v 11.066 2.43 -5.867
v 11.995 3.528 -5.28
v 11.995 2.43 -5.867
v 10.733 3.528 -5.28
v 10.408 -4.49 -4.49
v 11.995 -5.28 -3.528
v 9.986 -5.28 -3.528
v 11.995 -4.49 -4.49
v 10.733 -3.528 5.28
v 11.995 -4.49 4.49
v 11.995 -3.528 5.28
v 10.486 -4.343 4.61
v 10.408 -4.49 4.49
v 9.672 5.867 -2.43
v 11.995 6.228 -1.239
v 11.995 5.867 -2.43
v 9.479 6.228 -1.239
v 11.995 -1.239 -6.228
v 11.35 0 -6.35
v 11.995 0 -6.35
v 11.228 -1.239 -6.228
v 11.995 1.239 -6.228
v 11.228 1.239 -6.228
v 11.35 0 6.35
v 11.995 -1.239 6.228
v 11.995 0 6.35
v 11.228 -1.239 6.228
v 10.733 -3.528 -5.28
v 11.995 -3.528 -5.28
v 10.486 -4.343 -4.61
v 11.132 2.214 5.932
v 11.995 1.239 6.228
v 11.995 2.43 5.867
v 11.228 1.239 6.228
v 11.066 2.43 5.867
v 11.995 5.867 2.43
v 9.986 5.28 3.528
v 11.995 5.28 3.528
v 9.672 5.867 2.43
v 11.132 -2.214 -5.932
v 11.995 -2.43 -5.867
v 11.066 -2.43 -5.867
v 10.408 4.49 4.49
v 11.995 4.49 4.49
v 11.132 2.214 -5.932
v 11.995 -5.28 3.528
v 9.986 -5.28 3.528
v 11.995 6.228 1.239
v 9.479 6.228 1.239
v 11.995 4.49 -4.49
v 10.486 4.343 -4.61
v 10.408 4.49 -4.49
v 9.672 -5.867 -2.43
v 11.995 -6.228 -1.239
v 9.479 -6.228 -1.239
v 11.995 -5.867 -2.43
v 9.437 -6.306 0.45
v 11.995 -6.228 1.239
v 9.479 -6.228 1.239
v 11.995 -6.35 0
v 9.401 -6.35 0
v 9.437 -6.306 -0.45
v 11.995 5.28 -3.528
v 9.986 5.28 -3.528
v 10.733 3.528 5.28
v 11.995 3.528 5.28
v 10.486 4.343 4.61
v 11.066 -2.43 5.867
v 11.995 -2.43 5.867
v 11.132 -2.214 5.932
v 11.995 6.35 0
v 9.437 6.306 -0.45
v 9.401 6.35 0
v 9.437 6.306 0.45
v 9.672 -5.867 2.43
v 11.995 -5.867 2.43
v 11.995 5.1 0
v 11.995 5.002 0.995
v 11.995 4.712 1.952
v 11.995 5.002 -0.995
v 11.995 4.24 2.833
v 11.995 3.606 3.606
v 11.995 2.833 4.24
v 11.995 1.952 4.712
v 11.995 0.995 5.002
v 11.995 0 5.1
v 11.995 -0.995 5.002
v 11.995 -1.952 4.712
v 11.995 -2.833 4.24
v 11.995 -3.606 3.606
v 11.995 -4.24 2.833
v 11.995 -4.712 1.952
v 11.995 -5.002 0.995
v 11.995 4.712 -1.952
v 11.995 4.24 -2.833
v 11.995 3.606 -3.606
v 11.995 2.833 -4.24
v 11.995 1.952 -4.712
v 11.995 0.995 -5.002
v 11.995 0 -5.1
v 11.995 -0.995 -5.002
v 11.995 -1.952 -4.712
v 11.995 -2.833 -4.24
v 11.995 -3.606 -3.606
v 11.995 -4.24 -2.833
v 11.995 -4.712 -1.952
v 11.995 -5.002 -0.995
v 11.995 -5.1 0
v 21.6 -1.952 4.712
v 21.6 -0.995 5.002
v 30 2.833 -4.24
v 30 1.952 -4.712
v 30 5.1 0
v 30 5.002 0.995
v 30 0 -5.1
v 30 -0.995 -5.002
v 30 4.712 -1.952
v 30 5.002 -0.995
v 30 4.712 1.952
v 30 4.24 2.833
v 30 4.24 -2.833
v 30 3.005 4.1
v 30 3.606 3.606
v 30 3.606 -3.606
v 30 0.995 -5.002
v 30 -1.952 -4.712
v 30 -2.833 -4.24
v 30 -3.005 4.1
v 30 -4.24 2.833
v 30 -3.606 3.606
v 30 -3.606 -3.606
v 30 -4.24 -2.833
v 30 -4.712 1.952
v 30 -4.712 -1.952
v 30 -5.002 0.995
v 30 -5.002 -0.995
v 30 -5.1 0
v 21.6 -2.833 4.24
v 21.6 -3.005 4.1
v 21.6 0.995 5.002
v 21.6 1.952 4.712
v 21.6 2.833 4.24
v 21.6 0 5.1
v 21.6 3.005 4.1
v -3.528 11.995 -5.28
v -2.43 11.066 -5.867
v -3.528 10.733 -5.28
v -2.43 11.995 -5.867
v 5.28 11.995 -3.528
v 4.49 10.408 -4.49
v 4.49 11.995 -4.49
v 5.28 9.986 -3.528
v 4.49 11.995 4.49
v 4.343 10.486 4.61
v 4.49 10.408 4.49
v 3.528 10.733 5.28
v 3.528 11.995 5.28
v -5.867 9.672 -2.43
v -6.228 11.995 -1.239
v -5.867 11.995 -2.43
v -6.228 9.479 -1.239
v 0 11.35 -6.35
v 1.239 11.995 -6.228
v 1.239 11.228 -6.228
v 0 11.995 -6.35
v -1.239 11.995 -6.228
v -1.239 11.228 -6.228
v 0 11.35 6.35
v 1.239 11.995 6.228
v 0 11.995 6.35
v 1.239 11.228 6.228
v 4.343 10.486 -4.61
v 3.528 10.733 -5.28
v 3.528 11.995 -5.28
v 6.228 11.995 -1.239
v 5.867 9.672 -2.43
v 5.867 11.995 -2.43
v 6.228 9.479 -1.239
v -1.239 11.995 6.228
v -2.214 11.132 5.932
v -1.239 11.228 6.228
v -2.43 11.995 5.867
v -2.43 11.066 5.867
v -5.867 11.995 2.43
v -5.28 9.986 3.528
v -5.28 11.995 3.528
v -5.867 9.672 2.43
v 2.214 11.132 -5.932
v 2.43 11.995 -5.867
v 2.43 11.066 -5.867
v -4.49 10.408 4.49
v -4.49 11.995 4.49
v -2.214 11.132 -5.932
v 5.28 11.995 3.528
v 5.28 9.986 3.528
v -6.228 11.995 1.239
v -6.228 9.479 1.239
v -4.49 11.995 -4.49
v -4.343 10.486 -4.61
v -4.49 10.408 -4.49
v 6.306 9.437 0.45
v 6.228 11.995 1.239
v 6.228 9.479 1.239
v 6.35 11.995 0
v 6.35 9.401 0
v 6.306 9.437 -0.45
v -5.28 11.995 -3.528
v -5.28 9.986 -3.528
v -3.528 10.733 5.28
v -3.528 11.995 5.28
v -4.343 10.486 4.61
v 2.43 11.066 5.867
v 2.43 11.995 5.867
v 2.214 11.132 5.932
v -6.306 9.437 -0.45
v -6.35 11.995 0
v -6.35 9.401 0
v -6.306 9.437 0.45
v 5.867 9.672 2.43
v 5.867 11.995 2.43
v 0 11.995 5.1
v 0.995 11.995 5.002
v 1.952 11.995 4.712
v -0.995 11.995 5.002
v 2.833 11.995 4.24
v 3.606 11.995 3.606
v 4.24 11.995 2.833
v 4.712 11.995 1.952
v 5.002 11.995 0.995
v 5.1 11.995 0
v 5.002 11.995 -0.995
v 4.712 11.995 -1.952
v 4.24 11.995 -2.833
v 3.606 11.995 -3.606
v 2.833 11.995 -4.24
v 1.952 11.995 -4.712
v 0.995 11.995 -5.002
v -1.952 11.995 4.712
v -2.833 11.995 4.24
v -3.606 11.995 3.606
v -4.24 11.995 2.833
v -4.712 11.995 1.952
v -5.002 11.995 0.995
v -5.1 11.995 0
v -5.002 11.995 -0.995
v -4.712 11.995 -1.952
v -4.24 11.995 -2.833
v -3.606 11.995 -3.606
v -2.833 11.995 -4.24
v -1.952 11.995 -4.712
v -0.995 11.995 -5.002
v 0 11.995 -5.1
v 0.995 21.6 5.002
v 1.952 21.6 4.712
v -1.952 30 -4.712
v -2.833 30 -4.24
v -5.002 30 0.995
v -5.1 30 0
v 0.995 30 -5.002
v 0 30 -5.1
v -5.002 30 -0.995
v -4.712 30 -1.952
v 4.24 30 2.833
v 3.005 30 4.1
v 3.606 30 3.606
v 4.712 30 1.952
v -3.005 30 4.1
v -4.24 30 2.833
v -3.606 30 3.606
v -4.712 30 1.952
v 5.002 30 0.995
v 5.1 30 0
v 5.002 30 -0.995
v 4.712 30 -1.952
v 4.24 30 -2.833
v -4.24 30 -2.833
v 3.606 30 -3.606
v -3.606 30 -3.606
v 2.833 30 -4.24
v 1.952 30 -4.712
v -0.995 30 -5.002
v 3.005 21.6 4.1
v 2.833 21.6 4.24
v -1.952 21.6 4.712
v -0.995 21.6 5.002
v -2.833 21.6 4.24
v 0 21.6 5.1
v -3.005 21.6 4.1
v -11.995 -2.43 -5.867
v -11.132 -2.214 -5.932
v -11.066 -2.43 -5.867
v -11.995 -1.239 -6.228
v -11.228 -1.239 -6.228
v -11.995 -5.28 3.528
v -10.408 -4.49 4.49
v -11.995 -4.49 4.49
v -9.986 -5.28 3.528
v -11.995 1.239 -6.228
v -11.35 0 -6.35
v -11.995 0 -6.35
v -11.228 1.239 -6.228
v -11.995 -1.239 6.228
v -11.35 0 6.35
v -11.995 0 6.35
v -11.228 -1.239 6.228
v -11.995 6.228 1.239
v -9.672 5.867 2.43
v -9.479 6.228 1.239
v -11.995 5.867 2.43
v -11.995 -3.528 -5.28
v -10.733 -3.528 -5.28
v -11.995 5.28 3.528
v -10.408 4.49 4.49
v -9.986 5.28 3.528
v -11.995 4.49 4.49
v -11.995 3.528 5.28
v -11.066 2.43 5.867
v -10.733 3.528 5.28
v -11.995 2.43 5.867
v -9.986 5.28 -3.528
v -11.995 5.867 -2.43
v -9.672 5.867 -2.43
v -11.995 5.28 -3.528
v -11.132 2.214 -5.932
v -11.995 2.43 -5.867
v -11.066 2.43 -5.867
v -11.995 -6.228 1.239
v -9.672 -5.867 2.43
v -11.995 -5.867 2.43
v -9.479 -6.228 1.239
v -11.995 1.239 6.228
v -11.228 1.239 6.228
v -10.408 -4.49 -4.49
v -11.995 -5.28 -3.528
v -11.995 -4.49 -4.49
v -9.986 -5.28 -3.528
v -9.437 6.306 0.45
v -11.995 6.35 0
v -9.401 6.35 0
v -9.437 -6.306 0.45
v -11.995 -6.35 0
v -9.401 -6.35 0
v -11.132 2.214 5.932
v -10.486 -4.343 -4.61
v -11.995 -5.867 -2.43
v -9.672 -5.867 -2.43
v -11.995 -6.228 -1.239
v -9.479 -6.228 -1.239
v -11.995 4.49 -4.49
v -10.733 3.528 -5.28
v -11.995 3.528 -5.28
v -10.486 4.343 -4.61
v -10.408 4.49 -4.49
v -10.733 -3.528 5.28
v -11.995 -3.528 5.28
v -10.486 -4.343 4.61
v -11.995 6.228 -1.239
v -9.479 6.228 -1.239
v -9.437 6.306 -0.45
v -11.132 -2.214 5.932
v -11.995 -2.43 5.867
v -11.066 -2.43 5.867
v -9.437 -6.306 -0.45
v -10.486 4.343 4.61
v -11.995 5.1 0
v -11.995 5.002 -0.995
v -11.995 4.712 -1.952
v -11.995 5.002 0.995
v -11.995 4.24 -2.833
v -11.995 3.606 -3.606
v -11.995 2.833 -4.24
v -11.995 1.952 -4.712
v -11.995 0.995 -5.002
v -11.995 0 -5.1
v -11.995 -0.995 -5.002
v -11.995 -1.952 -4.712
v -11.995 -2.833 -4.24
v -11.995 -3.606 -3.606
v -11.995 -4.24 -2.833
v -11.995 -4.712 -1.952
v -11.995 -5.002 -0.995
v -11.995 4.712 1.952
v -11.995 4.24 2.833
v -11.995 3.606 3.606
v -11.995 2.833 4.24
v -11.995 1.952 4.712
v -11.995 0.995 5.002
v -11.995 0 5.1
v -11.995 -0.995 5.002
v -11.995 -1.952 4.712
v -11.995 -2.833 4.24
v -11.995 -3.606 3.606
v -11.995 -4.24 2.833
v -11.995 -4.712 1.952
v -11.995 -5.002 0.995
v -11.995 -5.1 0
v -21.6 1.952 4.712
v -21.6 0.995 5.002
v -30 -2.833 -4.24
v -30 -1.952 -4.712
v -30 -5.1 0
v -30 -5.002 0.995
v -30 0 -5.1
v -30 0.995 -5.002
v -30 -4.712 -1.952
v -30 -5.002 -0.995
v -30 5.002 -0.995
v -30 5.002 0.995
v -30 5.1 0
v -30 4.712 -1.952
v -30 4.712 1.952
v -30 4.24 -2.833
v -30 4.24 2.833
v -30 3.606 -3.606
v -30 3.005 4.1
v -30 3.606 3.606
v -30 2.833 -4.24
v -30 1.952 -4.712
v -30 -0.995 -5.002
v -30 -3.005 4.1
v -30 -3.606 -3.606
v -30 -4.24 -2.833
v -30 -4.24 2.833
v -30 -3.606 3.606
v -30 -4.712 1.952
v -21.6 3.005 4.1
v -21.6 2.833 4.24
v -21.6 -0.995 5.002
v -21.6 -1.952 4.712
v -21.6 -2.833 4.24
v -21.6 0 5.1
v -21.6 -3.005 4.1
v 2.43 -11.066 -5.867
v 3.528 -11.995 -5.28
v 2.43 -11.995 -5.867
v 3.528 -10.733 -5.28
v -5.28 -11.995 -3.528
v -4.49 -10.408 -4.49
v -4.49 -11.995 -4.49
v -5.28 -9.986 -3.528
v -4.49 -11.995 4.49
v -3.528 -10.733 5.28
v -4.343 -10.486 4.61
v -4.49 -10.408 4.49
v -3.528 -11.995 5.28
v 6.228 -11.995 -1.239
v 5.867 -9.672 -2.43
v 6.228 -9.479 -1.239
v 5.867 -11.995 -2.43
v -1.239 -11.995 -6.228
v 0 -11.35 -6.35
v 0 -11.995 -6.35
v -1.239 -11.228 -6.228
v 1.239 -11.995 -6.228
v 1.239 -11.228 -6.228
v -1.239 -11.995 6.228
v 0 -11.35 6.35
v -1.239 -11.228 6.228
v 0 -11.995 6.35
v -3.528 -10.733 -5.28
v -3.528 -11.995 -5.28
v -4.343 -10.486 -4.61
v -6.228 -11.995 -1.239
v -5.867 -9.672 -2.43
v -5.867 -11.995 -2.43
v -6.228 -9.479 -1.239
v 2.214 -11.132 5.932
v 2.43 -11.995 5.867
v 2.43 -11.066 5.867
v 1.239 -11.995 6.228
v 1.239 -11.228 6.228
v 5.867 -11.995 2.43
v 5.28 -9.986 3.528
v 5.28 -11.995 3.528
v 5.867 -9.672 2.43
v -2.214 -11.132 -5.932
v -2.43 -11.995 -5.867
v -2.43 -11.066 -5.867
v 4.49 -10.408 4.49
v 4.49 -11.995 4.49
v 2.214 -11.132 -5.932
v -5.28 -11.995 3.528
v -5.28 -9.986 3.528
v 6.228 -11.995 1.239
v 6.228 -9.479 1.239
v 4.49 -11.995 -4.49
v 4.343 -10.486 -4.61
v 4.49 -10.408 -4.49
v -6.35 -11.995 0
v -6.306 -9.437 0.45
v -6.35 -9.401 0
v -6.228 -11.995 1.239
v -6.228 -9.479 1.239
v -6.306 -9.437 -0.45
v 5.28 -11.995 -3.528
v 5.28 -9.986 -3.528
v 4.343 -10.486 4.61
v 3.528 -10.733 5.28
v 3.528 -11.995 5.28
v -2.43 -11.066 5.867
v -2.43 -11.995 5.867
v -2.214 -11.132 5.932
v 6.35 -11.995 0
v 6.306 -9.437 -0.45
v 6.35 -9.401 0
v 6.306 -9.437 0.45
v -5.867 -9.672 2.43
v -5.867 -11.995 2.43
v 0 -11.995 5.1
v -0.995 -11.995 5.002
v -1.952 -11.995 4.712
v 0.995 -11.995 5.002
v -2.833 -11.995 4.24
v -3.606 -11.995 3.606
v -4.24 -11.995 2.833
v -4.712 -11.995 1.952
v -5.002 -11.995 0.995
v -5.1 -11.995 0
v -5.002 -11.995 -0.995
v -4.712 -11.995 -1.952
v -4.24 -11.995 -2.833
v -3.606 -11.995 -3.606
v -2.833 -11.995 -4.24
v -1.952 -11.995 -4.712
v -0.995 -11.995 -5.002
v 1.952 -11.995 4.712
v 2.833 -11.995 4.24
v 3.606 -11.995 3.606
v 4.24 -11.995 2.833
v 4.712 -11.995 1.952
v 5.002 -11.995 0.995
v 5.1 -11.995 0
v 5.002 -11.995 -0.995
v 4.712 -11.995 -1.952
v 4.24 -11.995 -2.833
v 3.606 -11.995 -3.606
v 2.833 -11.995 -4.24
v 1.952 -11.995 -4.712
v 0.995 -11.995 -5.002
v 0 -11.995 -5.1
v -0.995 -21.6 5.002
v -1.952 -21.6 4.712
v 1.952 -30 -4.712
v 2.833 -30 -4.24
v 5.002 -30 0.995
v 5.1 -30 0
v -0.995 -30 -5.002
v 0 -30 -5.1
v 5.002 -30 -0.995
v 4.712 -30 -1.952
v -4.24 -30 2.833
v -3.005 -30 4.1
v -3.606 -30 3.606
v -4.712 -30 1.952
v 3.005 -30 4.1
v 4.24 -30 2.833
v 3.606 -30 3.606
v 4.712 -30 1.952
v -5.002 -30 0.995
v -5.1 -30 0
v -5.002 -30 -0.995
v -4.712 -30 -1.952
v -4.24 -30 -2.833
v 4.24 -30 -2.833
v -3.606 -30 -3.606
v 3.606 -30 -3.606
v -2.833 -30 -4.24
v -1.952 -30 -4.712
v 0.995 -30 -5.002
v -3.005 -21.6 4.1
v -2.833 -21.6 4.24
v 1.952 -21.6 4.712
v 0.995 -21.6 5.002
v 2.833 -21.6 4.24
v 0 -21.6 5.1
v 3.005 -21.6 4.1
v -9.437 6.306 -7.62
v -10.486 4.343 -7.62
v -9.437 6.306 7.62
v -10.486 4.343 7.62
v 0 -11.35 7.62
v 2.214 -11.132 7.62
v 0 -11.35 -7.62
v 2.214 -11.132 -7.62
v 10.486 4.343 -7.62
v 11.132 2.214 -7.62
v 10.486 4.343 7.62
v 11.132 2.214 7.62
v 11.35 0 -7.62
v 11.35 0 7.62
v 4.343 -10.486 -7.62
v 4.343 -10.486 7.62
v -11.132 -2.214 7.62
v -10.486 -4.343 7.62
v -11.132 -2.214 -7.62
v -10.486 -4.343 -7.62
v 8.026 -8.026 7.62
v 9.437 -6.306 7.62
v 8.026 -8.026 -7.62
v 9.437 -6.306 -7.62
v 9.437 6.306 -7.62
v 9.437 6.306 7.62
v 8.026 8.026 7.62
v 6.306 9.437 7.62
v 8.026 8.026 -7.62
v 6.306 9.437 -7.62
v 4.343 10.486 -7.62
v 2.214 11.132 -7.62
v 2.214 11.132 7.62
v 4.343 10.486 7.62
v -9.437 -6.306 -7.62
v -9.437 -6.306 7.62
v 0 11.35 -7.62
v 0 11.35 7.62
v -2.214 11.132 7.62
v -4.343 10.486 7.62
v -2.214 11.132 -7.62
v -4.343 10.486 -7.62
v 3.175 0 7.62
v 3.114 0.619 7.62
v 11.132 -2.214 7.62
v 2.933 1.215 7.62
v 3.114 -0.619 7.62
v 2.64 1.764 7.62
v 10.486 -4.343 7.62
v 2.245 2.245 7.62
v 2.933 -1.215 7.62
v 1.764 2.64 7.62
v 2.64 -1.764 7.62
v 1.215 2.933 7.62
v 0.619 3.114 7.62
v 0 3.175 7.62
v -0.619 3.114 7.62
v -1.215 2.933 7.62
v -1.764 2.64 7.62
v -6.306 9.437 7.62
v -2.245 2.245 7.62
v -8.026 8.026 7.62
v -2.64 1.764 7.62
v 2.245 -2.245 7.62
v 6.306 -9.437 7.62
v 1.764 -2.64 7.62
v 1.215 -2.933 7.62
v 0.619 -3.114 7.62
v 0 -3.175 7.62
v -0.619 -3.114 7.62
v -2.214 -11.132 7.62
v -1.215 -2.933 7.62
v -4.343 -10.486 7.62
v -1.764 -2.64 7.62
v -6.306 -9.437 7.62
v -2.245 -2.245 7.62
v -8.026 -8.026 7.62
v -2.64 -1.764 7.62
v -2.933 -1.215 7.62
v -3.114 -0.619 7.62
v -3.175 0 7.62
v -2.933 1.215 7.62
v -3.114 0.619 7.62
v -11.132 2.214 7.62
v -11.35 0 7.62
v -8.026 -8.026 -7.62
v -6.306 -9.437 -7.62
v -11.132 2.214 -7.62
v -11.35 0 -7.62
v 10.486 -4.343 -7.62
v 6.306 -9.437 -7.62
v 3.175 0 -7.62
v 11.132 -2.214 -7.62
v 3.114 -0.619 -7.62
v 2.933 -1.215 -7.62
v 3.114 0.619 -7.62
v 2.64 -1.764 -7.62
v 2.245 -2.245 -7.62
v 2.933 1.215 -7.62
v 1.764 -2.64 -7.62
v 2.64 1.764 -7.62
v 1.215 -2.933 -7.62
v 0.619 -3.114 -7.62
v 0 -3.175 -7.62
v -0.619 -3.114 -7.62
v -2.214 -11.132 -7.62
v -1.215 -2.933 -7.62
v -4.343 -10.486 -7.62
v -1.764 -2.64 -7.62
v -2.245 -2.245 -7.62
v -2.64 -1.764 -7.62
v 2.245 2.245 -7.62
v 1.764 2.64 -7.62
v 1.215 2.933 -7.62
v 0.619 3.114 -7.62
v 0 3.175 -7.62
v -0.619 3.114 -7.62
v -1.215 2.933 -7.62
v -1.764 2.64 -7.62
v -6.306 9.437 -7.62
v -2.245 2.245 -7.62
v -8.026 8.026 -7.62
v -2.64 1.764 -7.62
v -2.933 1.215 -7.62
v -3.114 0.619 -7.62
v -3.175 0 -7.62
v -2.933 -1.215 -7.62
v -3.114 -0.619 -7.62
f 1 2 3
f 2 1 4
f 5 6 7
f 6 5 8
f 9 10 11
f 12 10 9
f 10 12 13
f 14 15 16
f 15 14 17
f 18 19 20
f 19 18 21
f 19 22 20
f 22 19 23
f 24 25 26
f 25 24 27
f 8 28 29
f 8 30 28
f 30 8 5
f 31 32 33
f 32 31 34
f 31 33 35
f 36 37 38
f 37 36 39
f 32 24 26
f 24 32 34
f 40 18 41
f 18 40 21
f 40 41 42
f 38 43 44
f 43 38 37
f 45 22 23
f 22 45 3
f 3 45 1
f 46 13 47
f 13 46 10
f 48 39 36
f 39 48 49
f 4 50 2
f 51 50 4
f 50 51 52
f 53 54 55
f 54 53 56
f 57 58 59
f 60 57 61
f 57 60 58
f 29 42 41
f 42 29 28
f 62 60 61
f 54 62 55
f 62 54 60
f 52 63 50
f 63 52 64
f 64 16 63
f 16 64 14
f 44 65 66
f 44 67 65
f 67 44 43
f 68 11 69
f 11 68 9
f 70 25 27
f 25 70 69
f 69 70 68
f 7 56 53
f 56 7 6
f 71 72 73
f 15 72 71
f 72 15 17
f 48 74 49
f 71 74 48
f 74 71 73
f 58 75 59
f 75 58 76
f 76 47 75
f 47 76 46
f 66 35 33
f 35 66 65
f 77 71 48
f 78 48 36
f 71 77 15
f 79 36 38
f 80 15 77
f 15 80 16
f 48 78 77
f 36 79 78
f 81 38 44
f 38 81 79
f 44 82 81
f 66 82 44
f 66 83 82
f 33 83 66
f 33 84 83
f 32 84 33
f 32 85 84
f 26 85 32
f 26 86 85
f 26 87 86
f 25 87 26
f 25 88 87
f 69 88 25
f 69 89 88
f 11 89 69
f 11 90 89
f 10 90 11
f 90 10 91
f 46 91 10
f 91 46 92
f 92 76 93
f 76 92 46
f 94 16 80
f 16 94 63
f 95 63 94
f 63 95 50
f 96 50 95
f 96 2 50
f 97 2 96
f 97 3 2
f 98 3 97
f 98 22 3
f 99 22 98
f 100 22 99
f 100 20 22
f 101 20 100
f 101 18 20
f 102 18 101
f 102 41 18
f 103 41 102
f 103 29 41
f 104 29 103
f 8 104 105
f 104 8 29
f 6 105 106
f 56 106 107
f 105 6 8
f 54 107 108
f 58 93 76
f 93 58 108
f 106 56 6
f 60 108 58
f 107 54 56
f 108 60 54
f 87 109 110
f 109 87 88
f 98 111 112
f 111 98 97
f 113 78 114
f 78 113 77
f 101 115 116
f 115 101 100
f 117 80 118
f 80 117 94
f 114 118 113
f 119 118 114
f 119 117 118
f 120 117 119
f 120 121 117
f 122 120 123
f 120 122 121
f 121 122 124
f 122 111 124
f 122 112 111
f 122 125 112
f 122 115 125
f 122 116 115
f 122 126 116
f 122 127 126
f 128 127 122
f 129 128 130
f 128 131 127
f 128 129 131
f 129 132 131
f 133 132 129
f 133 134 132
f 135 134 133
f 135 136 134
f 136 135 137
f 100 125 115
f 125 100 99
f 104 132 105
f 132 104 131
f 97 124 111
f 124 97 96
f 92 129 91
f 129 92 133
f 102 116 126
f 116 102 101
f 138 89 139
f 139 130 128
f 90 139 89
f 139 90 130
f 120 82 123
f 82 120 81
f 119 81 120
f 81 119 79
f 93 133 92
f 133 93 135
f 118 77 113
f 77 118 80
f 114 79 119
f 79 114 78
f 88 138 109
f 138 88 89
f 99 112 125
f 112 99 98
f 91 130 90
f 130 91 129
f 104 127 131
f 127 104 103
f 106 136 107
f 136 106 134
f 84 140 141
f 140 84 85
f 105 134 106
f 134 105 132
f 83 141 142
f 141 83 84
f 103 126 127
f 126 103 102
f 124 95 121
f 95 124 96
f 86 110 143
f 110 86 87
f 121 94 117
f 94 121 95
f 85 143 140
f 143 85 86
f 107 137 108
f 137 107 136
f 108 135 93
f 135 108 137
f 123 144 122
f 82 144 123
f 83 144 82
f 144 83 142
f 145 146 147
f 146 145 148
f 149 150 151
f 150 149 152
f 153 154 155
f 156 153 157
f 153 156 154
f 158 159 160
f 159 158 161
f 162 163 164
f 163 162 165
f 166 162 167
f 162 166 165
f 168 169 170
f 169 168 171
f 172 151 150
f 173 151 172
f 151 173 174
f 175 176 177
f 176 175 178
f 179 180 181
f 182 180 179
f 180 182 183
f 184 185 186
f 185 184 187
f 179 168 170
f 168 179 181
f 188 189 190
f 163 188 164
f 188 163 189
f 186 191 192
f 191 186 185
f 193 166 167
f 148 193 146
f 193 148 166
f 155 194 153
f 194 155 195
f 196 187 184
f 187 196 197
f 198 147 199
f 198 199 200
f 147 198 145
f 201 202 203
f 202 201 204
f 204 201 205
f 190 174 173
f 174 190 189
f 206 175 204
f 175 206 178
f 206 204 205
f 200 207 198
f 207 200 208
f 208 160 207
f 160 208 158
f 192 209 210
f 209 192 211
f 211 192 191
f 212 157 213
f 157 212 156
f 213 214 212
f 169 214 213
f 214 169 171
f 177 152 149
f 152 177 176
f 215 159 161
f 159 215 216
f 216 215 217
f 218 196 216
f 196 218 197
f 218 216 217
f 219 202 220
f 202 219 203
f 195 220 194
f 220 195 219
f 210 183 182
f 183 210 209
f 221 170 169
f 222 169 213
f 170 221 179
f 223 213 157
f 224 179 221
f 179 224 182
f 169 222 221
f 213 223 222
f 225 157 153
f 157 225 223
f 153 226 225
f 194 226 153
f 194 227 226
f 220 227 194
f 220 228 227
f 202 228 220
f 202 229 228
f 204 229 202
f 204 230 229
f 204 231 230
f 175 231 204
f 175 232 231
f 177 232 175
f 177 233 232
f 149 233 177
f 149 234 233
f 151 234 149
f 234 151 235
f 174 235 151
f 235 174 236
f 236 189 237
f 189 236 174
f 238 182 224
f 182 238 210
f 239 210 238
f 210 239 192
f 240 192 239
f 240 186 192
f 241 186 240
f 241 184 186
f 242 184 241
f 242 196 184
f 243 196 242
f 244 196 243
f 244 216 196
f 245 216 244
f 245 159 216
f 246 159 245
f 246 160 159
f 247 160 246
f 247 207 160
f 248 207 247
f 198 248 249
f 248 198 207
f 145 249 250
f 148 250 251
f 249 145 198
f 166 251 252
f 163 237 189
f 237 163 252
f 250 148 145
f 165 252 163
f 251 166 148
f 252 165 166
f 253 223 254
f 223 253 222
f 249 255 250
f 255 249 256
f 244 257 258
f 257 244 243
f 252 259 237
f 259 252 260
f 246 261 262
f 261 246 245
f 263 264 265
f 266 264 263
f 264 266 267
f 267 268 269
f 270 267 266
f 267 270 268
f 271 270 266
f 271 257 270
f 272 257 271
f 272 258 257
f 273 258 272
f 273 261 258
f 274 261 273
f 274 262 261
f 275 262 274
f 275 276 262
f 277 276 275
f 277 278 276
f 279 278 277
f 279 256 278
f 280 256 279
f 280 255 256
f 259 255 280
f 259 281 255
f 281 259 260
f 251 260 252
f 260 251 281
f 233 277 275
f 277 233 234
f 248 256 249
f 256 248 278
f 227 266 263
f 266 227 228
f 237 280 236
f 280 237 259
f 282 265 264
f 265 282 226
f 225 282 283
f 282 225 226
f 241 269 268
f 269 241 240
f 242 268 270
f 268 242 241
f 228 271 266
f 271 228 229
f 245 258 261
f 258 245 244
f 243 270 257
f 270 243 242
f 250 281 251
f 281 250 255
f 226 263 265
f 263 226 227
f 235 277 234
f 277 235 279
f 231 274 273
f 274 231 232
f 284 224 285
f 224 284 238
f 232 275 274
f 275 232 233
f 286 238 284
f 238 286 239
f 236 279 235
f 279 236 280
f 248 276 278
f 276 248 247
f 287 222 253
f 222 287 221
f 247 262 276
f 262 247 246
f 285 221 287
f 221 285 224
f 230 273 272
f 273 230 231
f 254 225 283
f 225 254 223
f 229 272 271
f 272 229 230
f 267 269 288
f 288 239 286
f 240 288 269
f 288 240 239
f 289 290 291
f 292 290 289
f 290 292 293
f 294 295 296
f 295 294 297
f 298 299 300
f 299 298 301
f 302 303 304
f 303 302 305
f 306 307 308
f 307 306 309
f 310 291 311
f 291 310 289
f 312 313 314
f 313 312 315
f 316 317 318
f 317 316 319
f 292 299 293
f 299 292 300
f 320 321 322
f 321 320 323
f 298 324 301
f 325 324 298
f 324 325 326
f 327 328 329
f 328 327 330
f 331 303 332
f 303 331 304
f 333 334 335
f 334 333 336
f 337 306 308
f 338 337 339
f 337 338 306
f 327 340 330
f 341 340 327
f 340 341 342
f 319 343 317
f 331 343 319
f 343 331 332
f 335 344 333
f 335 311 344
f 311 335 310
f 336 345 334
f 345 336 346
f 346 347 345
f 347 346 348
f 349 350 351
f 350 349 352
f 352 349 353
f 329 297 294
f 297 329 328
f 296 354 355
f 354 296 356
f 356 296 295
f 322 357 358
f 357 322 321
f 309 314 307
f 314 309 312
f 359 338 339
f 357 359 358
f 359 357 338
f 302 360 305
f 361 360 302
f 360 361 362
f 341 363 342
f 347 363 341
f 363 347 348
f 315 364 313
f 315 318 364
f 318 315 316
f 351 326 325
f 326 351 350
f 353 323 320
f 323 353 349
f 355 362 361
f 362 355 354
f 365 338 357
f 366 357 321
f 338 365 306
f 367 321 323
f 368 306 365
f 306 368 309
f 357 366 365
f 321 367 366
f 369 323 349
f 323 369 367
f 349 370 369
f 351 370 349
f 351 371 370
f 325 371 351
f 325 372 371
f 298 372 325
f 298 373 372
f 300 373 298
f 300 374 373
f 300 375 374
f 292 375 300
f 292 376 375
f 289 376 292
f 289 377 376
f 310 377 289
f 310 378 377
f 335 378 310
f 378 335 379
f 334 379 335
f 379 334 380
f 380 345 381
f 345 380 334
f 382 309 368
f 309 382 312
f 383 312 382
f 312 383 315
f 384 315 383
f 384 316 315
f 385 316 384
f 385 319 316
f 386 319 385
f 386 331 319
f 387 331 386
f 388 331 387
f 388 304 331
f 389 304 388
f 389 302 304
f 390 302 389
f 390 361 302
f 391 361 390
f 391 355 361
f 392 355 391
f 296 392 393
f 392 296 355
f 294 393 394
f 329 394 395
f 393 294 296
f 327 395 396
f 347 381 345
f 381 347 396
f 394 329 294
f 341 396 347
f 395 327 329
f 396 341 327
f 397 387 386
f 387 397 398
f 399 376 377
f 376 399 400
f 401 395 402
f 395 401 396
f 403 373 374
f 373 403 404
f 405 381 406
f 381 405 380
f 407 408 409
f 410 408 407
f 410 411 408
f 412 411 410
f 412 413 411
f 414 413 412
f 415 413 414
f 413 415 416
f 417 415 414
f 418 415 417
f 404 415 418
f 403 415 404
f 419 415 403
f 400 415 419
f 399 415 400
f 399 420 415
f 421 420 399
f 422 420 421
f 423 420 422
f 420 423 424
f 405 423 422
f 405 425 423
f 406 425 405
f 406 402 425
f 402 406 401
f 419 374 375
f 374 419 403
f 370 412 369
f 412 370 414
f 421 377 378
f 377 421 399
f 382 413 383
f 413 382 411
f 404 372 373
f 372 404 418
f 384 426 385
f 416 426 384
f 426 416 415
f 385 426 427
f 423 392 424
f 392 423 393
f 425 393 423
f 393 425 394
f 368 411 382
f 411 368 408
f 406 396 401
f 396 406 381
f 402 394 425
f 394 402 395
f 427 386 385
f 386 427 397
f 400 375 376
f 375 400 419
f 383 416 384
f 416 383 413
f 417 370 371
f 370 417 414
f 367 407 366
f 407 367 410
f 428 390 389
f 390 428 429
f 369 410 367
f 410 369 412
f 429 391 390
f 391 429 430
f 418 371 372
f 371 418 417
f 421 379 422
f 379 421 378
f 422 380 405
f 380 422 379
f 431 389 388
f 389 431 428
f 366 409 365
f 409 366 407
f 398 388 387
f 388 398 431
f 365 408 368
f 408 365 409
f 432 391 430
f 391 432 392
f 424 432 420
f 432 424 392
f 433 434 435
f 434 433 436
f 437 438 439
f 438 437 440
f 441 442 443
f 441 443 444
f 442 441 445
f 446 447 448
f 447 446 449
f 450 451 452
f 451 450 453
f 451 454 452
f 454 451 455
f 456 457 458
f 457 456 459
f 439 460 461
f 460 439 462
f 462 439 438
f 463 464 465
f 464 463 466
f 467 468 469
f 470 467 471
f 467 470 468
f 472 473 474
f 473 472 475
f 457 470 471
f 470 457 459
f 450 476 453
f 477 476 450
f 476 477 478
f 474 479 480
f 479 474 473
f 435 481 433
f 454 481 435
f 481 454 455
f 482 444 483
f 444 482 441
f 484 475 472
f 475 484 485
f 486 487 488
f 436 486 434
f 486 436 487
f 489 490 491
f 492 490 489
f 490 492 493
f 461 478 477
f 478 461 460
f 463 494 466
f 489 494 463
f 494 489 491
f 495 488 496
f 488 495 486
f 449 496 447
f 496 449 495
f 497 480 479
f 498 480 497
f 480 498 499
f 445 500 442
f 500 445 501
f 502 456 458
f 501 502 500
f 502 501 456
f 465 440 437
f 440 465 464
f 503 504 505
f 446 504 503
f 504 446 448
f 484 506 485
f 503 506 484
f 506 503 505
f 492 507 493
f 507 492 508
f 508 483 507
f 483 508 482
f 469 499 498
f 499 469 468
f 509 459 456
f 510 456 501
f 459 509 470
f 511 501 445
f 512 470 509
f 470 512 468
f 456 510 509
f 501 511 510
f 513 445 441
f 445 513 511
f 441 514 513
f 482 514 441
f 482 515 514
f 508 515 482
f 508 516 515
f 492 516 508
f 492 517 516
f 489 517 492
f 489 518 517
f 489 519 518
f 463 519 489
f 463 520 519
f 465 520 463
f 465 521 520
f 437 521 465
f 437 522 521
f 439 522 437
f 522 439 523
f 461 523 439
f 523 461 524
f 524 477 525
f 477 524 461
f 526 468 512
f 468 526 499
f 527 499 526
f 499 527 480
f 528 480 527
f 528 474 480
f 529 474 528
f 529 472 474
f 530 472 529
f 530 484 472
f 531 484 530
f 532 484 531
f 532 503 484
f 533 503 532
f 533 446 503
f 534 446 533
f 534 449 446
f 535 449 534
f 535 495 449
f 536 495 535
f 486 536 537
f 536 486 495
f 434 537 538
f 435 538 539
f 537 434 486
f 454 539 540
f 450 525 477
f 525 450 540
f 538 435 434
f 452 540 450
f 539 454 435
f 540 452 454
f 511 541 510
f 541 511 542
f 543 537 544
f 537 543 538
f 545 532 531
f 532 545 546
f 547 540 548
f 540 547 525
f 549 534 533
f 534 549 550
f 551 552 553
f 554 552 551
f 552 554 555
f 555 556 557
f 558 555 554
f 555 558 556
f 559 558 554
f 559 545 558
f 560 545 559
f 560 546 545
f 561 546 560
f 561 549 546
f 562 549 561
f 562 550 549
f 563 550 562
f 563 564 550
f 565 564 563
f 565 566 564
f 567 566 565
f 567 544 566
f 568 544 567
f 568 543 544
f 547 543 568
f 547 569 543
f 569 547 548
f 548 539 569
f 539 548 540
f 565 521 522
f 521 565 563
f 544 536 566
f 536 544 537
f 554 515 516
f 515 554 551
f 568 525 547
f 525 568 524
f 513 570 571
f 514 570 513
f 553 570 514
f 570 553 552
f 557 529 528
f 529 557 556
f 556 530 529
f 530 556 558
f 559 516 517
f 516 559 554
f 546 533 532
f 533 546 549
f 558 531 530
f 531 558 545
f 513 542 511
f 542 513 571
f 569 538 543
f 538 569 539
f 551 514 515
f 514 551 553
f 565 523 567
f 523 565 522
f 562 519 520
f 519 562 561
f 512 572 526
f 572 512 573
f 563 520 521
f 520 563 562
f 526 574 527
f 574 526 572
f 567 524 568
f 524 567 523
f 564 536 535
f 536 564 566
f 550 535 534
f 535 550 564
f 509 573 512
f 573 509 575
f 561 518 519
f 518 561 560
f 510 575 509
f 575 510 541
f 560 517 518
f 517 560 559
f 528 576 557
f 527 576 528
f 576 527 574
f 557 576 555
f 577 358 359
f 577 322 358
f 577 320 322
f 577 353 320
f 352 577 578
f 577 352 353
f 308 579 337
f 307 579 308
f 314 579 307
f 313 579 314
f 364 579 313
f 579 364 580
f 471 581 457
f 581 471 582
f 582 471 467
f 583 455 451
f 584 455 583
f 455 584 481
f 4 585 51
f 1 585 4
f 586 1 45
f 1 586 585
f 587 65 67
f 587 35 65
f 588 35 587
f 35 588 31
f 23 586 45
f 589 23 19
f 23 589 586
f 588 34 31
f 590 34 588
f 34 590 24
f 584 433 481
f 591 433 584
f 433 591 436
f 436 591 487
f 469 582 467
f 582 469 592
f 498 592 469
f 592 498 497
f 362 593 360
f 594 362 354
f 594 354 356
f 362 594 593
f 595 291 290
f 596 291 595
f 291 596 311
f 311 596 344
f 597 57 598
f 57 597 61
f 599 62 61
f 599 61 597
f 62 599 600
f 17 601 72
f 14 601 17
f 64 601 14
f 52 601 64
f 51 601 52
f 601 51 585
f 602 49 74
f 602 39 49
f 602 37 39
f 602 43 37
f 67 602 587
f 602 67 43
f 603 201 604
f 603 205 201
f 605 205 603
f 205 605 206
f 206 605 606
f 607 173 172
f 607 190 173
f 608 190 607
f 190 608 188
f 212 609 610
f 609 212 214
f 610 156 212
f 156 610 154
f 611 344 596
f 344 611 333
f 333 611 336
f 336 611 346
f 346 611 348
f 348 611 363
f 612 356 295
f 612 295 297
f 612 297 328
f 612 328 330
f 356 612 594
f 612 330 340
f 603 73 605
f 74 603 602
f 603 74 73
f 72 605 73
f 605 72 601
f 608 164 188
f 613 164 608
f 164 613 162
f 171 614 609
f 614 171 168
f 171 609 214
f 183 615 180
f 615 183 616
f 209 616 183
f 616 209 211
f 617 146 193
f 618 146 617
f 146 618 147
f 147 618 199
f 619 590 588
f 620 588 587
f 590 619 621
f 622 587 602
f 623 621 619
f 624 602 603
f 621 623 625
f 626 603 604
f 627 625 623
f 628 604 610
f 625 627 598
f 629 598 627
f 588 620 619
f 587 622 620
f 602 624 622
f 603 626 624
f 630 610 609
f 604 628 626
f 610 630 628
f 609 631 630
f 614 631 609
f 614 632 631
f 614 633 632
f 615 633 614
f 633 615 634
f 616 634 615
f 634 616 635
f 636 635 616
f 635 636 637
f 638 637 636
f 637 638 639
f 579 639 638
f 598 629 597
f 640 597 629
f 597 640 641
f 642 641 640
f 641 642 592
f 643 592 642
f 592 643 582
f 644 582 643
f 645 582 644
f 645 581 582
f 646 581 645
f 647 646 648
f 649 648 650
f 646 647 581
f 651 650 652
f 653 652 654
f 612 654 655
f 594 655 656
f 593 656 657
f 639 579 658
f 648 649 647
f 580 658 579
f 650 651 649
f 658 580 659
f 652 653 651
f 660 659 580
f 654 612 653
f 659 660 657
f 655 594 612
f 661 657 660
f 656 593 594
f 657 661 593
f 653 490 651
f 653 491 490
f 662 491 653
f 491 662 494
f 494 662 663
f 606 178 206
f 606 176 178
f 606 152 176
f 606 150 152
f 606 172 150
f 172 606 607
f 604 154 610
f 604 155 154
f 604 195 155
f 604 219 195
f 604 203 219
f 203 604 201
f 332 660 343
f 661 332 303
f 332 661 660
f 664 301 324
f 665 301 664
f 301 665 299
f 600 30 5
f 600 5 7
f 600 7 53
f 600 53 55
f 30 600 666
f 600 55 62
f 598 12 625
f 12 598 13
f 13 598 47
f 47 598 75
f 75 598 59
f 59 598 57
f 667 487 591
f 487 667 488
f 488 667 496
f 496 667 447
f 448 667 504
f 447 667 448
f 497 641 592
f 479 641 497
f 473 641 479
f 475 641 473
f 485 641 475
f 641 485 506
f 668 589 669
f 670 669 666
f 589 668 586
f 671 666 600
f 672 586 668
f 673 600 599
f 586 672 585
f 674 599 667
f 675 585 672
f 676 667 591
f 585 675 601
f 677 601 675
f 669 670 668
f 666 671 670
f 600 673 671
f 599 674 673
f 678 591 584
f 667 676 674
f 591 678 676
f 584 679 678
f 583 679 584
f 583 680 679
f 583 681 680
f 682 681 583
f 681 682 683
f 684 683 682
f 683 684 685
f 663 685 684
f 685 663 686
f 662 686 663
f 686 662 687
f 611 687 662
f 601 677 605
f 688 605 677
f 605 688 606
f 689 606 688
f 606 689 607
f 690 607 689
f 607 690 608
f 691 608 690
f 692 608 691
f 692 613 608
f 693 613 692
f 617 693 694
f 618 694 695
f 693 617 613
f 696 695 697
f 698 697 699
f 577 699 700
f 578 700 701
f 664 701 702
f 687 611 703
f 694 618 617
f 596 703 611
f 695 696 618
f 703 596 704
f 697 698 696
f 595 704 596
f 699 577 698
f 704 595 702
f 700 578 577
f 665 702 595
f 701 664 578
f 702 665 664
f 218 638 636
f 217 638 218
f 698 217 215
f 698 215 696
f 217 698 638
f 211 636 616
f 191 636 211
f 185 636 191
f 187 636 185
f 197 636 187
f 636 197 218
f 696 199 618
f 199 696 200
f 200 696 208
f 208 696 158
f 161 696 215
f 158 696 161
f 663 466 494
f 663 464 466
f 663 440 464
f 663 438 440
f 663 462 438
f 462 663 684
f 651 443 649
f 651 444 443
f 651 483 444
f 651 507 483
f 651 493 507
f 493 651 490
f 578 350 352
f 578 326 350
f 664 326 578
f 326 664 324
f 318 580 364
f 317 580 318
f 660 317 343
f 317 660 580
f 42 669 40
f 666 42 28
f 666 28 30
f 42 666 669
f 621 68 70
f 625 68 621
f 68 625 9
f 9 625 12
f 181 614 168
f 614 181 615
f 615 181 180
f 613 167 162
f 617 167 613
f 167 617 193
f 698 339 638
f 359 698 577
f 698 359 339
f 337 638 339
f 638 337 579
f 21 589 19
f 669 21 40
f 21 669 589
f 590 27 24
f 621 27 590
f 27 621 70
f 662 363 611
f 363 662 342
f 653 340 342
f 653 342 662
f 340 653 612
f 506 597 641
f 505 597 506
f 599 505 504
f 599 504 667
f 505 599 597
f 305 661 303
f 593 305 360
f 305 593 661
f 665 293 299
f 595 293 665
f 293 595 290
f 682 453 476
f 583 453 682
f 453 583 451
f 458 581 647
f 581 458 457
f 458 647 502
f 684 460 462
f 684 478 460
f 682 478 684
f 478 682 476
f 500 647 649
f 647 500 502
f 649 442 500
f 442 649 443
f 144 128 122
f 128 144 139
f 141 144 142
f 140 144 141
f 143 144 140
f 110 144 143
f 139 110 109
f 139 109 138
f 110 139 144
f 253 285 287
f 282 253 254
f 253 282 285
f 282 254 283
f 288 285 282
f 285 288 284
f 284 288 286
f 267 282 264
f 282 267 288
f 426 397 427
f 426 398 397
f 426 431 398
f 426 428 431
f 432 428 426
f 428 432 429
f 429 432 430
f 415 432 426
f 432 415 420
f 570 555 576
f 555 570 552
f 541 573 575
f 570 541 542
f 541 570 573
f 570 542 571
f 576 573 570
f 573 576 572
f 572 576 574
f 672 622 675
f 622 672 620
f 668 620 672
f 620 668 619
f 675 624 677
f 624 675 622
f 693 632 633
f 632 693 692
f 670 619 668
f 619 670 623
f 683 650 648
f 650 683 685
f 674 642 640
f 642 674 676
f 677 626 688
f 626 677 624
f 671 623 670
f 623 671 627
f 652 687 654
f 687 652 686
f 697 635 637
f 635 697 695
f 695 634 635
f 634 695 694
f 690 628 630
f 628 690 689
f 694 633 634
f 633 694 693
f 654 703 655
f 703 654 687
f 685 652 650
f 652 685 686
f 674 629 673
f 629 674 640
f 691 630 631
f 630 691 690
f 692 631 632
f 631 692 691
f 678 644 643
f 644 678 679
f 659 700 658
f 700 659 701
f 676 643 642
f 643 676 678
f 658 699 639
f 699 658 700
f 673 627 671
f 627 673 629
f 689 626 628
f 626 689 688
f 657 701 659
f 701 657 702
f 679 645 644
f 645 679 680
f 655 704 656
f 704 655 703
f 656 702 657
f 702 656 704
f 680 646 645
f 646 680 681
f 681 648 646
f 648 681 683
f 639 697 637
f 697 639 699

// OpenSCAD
$fn = 32;

// ----------------------------------------------------------------------
// Cardan cross: 60 mm span, 12.7 mm trunnions
// ----------------------------------------------------------------------

// --- parameters (mm) ---
journal_d = 12.7;         // trunnion diameter
arm_len = 30;             // trunnion length from the centre
step_r = 4.32;            // step position from the centre
step_d = 10.2;            // journal diameter after the step
hub_d = 22.7;             // hub diameter
hub_h = 15.24;            // hub height
bore_d = 6.35;            // hub bore
flat_d = 1;               // depth of the journal flat
flat_len = 8.4;           // length of the journal flat

difference() {
  union() {
    /* hub along the joint axis */
    cylinder(h = hub_h, d = hub_d, center = true);
    for (a = [0 : 90 : 270]) rotate([0, 0, a]) {
      /* trunnion, sunk into the hub */
      translate([hub_d / 4, 0, 0]) rotate([0, 90, 0]) cylinder(h = step_r + 2, d = journal_d);
      /* stepped journal out to the tip */
      translate([step_r - 0.5, 0, 0]) rotate([0, 90, 0]) cylinder(h = arm_len + 0.5 - step_r, d = step_d);
    }
  }
  /* lubrication bore through the hub, 2.5 mm clear on both sides */
  translate([0, 0, -hub_h / 2 - 2.5]) cylinder(h = hub_h + 5, d = bore_d);
  /* machined flat on each journal tip */
  for (a = [0 : 90 : 270]) rotate([0, 0, a]) {
    translate([arm_len - flat_len, -step_d, step_d / 2 - flat_d]) cube([flat_len + 0.5, 2 * step_d, flat_d + 2.5]);
  }
}
